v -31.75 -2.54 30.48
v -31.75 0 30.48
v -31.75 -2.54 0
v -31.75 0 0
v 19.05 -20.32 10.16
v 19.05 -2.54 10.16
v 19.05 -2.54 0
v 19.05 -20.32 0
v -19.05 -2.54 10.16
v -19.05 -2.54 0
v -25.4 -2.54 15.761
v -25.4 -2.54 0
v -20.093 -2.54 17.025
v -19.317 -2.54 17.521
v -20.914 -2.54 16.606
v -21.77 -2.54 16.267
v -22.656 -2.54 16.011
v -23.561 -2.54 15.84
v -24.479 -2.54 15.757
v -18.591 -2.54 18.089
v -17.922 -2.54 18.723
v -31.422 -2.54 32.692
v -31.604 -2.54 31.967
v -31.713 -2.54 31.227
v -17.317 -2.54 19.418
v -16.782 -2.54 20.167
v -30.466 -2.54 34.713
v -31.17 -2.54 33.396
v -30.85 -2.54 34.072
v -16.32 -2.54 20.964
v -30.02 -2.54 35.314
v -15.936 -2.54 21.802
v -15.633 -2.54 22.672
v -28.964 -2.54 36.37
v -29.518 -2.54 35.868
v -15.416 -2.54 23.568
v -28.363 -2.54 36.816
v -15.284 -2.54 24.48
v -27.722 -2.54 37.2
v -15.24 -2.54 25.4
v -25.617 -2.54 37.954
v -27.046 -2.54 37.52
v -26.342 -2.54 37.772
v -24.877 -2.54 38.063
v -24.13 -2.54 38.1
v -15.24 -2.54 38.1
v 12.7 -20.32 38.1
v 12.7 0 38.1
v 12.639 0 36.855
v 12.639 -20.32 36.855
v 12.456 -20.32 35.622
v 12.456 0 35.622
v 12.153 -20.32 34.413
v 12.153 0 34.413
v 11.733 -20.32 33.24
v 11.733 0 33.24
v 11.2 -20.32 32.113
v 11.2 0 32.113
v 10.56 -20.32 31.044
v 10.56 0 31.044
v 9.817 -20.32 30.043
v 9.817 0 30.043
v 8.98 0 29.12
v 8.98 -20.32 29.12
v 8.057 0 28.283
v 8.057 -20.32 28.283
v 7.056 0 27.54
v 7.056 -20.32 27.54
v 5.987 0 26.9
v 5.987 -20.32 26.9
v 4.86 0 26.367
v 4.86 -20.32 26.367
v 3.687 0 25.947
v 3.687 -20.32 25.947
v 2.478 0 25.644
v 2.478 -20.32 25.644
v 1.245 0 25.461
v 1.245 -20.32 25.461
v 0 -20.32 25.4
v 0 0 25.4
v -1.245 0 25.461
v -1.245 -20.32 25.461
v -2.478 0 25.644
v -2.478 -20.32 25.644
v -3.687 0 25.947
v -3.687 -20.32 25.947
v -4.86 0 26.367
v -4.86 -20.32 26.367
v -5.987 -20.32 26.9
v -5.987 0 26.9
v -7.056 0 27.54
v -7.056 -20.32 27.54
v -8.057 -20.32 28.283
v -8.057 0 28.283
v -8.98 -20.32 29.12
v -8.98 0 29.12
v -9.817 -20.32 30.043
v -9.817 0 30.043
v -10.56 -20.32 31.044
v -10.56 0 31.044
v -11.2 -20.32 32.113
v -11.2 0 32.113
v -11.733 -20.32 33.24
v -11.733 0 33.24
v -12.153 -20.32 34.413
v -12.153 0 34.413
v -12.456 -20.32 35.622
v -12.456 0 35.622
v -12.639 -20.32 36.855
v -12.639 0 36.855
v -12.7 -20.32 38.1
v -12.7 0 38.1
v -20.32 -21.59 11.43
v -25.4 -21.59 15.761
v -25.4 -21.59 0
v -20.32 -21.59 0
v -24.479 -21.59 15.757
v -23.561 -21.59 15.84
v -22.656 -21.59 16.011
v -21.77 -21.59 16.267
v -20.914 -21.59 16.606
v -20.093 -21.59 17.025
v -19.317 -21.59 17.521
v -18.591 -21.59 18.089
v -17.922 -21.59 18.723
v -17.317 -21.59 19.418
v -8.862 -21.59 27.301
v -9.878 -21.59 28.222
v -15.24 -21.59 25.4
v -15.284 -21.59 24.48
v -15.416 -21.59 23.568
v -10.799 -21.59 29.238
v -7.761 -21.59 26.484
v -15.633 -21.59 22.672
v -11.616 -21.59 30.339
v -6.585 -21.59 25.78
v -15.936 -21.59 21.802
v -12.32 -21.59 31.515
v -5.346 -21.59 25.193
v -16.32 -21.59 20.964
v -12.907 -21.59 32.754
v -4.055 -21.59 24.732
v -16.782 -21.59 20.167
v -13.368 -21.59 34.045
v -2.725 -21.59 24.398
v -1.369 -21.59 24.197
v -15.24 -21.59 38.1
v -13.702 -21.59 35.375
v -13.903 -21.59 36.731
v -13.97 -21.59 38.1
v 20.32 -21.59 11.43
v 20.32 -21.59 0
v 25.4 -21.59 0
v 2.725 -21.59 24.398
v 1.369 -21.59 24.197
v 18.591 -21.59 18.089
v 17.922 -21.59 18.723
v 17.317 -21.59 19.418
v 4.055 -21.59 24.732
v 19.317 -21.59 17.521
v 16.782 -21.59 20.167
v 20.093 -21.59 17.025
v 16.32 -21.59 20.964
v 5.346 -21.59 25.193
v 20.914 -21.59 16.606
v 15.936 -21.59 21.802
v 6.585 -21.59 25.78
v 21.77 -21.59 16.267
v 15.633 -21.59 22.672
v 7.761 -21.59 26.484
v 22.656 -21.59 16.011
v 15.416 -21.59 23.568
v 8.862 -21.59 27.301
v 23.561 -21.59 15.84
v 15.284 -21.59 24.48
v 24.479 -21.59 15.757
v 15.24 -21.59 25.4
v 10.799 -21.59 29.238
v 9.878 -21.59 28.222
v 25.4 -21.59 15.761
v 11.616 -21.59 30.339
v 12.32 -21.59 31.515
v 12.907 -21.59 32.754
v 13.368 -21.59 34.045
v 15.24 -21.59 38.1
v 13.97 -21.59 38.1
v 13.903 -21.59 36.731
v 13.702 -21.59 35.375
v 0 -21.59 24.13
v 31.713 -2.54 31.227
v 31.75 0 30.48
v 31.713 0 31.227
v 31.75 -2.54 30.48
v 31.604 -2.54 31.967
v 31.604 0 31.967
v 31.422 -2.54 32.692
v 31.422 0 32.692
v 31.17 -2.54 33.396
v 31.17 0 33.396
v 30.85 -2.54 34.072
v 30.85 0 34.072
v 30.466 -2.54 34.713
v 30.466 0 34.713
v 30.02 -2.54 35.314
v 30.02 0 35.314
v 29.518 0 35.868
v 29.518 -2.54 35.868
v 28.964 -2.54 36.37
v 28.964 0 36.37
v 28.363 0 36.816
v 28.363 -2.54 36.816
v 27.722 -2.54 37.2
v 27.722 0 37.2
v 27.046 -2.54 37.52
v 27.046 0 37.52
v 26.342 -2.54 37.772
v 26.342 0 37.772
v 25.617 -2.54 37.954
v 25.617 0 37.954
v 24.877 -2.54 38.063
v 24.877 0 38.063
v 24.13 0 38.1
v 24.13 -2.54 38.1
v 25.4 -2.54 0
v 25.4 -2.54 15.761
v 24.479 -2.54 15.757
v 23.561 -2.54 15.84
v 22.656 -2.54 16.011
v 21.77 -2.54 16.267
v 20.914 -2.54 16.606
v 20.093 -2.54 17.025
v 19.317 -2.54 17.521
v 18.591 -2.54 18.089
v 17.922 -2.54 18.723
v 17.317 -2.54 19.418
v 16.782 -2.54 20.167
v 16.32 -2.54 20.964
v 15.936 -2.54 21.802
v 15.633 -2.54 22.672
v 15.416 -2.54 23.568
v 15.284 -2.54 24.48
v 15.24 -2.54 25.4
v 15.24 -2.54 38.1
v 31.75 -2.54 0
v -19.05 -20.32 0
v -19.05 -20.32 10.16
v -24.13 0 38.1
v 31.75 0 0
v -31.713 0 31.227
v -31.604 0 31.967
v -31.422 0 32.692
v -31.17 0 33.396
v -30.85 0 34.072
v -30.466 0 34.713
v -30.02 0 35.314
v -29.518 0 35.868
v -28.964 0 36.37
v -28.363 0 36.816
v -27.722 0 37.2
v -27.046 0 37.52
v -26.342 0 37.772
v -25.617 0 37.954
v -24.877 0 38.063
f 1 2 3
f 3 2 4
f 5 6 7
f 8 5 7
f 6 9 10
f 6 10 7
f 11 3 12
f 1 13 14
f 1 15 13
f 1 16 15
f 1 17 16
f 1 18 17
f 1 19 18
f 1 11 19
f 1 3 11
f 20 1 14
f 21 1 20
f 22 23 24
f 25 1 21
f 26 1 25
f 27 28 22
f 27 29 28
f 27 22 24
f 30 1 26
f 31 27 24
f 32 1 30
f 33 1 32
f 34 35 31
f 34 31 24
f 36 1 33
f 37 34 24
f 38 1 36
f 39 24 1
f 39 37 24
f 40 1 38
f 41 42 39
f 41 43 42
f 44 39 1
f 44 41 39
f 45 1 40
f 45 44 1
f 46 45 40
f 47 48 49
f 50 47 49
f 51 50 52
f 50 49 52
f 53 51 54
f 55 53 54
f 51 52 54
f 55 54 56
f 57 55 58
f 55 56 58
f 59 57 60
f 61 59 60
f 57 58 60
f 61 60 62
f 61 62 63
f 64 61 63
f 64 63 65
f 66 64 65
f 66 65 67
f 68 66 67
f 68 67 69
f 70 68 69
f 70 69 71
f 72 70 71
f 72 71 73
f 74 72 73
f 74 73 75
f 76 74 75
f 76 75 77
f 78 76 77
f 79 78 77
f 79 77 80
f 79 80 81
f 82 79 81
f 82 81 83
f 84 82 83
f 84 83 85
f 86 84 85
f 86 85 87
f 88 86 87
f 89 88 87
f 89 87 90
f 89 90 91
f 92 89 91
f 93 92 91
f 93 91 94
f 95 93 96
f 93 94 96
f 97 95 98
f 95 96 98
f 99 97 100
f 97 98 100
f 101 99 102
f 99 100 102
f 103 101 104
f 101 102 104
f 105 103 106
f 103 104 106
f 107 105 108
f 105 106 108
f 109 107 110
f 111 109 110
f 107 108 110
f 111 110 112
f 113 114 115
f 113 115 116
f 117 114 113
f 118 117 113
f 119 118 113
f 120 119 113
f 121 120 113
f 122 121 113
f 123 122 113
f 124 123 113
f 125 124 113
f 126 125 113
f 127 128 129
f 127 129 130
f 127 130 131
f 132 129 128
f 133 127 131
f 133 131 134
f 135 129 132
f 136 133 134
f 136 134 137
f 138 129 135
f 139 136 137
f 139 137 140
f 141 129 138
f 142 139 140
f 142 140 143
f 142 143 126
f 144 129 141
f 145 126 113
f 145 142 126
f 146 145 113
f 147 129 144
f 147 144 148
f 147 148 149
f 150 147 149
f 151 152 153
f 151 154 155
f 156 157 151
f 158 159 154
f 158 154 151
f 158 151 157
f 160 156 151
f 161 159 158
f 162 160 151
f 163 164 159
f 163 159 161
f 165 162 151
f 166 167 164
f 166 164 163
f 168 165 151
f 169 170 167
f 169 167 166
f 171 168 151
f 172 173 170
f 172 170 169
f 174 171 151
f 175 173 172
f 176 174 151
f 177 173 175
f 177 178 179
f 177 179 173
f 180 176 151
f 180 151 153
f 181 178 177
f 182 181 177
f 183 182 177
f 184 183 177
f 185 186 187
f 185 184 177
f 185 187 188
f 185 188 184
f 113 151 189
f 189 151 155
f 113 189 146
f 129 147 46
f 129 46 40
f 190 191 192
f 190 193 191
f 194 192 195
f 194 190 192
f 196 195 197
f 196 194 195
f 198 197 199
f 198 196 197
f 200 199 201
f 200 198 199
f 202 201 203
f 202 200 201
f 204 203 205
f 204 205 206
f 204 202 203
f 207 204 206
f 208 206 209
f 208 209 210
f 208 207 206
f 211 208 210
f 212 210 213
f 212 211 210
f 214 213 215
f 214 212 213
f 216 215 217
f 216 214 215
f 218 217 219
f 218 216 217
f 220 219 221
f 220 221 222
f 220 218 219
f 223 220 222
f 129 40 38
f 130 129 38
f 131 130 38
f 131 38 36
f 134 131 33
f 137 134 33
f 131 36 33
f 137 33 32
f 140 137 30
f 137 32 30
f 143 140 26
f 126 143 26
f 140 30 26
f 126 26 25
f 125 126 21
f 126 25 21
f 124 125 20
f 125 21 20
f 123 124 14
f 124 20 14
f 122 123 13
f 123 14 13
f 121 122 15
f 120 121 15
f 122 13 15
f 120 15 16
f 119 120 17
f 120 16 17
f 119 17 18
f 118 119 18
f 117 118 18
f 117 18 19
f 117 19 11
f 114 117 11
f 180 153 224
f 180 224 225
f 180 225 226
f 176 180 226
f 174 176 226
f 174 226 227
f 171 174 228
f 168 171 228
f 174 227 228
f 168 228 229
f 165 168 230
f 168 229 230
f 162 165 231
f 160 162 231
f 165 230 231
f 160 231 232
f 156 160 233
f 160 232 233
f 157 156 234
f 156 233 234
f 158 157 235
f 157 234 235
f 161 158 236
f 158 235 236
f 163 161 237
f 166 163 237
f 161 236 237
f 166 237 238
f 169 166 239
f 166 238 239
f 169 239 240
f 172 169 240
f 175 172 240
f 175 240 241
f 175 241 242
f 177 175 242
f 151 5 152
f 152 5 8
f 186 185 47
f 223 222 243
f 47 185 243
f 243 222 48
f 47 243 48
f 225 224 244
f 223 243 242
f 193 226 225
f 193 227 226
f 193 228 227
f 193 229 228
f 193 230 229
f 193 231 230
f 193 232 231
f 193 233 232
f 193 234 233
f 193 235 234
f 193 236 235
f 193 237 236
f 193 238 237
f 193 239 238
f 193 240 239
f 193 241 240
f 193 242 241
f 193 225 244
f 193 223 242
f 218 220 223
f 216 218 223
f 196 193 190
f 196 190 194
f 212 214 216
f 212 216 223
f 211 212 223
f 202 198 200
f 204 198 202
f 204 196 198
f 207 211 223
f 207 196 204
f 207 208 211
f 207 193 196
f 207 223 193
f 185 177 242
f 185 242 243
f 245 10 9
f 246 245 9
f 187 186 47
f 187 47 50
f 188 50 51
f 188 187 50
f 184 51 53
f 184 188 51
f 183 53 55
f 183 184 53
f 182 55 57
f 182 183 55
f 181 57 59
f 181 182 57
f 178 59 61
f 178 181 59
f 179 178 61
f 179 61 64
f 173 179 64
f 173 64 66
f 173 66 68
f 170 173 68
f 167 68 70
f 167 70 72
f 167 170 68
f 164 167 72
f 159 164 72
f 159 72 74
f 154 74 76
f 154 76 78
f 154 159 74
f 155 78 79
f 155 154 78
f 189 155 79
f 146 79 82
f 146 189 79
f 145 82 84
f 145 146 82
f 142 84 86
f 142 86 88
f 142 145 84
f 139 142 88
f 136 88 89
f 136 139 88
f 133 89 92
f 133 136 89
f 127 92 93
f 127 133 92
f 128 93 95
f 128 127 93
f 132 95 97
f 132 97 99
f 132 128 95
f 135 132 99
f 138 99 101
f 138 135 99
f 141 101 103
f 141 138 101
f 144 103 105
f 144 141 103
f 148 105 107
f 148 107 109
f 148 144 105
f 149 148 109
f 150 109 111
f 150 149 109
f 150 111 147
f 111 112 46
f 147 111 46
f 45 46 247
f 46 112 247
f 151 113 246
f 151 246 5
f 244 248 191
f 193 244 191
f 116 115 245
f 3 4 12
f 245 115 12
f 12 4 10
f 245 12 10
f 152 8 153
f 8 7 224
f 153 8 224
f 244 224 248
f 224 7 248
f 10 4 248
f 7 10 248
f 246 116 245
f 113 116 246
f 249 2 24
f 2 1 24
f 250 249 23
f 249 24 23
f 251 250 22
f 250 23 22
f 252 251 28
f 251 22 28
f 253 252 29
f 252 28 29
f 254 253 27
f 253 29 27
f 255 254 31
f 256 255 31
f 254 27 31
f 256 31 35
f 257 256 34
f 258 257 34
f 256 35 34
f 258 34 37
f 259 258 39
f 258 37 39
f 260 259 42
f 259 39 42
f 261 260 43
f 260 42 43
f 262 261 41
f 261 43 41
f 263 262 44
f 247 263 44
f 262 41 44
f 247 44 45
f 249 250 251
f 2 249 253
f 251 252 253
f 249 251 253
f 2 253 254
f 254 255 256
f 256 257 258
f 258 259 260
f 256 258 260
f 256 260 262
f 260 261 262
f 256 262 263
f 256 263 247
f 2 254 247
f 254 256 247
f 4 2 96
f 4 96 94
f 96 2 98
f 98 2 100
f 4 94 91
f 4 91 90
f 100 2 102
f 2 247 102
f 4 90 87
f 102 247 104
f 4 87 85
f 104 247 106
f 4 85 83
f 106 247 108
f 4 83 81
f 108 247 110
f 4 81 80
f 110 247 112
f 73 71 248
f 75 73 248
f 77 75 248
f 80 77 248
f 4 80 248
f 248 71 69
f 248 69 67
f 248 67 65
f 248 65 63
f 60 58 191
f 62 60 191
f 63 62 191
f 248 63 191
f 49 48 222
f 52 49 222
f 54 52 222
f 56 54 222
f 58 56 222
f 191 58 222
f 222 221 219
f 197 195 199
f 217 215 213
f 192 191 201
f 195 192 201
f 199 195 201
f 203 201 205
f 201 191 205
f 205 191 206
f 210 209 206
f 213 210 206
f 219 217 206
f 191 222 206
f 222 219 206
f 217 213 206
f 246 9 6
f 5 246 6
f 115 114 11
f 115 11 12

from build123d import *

# Parameters (mm, degrees)
F1_DEPTH = 2.54
F3_DEPTH = 19.05
F4_SIZE  = 1.27
F5_R     = 7.62


with BuildPart() as f1:
    # F0 (on Front) → F1 (new body)
    with BuildSketch(Plane.XZ):
        with BuildLine():
            Line((-31.75, 38.1), (-31.75, 0))
            Line((-31.75, 0), (31.75, 0))
            Line((31.75, 0), (31.75, 38.1))
            Line((31.75, 38.1), (12.7, 38.1))
            ThreePointArc((12.7, 38.1), (0, 25.4), (-12.7, 38.1))
            Line((-12.7, 38.1), (-31.75, 38.1))
        make_face()
    extrude(amount=F1_DEPTH)

    # F2 (on face) → F3 (join)
    with BuildSketch(Plane.XZ.offset(2.54)):
        with BuildLine():
            Line((19.05, 0), (25.4, 0))
            Line((25.4, 0), (25.4, 15.761378))
            ThreePointArc((25.4, 15.761378), (18.249038, 18.397703), (15.24, 25.4))
            Line((15.24, 25.4), (15.24, 38.1))
            Line((15.24, 38.1), (12.7, 38.1))
            ThreePointArc((12.7, 38.1), (0, 25.4), (-12.7, 38.1))
            Line((-12.7, 38.1), (-15.24, 38.1))
            Line((-15.24, 38.1), (-15.24, 25.4))
            ThreePointArc((-15.24, 25.4), (-18.249038, 18.397703), (-25.4, 15.761378))
            Line((-25.4, 15.761378), (-25.4, 0))
            Line((-25.4, 0), (-19.05, 0))
            Line((-19.05, 0), (-19.05, 10.16))
            Line((-19.05, 10.16), (19.05, 10.16))
            Line((19.05, 10.16), (19.05, 0))
        make_face()
    extrude(amount=F3_DEPTH)

    # F4
    f4_edges = [f1.edges().sort_by_distance(p)[0] for p in [
        (0, -21.59, 10.16),
        (-19.05, -21.59, 5.08),
        (19.05, -21.59, 5.08),
        (0, -21.59, 25.4),
    ]]
    chamfer(f4_edges, length=F4_SIZE)

    # F5
    f5_edges = [f1.edges().sort_by_distance(p)[0] for p in [
        (-31.75, -1.27, 38.1),
        (31.75, -1.27, 38.1),
    ]]
    fillet(f5_edges, radius=F5_R)


solid = f1.part
